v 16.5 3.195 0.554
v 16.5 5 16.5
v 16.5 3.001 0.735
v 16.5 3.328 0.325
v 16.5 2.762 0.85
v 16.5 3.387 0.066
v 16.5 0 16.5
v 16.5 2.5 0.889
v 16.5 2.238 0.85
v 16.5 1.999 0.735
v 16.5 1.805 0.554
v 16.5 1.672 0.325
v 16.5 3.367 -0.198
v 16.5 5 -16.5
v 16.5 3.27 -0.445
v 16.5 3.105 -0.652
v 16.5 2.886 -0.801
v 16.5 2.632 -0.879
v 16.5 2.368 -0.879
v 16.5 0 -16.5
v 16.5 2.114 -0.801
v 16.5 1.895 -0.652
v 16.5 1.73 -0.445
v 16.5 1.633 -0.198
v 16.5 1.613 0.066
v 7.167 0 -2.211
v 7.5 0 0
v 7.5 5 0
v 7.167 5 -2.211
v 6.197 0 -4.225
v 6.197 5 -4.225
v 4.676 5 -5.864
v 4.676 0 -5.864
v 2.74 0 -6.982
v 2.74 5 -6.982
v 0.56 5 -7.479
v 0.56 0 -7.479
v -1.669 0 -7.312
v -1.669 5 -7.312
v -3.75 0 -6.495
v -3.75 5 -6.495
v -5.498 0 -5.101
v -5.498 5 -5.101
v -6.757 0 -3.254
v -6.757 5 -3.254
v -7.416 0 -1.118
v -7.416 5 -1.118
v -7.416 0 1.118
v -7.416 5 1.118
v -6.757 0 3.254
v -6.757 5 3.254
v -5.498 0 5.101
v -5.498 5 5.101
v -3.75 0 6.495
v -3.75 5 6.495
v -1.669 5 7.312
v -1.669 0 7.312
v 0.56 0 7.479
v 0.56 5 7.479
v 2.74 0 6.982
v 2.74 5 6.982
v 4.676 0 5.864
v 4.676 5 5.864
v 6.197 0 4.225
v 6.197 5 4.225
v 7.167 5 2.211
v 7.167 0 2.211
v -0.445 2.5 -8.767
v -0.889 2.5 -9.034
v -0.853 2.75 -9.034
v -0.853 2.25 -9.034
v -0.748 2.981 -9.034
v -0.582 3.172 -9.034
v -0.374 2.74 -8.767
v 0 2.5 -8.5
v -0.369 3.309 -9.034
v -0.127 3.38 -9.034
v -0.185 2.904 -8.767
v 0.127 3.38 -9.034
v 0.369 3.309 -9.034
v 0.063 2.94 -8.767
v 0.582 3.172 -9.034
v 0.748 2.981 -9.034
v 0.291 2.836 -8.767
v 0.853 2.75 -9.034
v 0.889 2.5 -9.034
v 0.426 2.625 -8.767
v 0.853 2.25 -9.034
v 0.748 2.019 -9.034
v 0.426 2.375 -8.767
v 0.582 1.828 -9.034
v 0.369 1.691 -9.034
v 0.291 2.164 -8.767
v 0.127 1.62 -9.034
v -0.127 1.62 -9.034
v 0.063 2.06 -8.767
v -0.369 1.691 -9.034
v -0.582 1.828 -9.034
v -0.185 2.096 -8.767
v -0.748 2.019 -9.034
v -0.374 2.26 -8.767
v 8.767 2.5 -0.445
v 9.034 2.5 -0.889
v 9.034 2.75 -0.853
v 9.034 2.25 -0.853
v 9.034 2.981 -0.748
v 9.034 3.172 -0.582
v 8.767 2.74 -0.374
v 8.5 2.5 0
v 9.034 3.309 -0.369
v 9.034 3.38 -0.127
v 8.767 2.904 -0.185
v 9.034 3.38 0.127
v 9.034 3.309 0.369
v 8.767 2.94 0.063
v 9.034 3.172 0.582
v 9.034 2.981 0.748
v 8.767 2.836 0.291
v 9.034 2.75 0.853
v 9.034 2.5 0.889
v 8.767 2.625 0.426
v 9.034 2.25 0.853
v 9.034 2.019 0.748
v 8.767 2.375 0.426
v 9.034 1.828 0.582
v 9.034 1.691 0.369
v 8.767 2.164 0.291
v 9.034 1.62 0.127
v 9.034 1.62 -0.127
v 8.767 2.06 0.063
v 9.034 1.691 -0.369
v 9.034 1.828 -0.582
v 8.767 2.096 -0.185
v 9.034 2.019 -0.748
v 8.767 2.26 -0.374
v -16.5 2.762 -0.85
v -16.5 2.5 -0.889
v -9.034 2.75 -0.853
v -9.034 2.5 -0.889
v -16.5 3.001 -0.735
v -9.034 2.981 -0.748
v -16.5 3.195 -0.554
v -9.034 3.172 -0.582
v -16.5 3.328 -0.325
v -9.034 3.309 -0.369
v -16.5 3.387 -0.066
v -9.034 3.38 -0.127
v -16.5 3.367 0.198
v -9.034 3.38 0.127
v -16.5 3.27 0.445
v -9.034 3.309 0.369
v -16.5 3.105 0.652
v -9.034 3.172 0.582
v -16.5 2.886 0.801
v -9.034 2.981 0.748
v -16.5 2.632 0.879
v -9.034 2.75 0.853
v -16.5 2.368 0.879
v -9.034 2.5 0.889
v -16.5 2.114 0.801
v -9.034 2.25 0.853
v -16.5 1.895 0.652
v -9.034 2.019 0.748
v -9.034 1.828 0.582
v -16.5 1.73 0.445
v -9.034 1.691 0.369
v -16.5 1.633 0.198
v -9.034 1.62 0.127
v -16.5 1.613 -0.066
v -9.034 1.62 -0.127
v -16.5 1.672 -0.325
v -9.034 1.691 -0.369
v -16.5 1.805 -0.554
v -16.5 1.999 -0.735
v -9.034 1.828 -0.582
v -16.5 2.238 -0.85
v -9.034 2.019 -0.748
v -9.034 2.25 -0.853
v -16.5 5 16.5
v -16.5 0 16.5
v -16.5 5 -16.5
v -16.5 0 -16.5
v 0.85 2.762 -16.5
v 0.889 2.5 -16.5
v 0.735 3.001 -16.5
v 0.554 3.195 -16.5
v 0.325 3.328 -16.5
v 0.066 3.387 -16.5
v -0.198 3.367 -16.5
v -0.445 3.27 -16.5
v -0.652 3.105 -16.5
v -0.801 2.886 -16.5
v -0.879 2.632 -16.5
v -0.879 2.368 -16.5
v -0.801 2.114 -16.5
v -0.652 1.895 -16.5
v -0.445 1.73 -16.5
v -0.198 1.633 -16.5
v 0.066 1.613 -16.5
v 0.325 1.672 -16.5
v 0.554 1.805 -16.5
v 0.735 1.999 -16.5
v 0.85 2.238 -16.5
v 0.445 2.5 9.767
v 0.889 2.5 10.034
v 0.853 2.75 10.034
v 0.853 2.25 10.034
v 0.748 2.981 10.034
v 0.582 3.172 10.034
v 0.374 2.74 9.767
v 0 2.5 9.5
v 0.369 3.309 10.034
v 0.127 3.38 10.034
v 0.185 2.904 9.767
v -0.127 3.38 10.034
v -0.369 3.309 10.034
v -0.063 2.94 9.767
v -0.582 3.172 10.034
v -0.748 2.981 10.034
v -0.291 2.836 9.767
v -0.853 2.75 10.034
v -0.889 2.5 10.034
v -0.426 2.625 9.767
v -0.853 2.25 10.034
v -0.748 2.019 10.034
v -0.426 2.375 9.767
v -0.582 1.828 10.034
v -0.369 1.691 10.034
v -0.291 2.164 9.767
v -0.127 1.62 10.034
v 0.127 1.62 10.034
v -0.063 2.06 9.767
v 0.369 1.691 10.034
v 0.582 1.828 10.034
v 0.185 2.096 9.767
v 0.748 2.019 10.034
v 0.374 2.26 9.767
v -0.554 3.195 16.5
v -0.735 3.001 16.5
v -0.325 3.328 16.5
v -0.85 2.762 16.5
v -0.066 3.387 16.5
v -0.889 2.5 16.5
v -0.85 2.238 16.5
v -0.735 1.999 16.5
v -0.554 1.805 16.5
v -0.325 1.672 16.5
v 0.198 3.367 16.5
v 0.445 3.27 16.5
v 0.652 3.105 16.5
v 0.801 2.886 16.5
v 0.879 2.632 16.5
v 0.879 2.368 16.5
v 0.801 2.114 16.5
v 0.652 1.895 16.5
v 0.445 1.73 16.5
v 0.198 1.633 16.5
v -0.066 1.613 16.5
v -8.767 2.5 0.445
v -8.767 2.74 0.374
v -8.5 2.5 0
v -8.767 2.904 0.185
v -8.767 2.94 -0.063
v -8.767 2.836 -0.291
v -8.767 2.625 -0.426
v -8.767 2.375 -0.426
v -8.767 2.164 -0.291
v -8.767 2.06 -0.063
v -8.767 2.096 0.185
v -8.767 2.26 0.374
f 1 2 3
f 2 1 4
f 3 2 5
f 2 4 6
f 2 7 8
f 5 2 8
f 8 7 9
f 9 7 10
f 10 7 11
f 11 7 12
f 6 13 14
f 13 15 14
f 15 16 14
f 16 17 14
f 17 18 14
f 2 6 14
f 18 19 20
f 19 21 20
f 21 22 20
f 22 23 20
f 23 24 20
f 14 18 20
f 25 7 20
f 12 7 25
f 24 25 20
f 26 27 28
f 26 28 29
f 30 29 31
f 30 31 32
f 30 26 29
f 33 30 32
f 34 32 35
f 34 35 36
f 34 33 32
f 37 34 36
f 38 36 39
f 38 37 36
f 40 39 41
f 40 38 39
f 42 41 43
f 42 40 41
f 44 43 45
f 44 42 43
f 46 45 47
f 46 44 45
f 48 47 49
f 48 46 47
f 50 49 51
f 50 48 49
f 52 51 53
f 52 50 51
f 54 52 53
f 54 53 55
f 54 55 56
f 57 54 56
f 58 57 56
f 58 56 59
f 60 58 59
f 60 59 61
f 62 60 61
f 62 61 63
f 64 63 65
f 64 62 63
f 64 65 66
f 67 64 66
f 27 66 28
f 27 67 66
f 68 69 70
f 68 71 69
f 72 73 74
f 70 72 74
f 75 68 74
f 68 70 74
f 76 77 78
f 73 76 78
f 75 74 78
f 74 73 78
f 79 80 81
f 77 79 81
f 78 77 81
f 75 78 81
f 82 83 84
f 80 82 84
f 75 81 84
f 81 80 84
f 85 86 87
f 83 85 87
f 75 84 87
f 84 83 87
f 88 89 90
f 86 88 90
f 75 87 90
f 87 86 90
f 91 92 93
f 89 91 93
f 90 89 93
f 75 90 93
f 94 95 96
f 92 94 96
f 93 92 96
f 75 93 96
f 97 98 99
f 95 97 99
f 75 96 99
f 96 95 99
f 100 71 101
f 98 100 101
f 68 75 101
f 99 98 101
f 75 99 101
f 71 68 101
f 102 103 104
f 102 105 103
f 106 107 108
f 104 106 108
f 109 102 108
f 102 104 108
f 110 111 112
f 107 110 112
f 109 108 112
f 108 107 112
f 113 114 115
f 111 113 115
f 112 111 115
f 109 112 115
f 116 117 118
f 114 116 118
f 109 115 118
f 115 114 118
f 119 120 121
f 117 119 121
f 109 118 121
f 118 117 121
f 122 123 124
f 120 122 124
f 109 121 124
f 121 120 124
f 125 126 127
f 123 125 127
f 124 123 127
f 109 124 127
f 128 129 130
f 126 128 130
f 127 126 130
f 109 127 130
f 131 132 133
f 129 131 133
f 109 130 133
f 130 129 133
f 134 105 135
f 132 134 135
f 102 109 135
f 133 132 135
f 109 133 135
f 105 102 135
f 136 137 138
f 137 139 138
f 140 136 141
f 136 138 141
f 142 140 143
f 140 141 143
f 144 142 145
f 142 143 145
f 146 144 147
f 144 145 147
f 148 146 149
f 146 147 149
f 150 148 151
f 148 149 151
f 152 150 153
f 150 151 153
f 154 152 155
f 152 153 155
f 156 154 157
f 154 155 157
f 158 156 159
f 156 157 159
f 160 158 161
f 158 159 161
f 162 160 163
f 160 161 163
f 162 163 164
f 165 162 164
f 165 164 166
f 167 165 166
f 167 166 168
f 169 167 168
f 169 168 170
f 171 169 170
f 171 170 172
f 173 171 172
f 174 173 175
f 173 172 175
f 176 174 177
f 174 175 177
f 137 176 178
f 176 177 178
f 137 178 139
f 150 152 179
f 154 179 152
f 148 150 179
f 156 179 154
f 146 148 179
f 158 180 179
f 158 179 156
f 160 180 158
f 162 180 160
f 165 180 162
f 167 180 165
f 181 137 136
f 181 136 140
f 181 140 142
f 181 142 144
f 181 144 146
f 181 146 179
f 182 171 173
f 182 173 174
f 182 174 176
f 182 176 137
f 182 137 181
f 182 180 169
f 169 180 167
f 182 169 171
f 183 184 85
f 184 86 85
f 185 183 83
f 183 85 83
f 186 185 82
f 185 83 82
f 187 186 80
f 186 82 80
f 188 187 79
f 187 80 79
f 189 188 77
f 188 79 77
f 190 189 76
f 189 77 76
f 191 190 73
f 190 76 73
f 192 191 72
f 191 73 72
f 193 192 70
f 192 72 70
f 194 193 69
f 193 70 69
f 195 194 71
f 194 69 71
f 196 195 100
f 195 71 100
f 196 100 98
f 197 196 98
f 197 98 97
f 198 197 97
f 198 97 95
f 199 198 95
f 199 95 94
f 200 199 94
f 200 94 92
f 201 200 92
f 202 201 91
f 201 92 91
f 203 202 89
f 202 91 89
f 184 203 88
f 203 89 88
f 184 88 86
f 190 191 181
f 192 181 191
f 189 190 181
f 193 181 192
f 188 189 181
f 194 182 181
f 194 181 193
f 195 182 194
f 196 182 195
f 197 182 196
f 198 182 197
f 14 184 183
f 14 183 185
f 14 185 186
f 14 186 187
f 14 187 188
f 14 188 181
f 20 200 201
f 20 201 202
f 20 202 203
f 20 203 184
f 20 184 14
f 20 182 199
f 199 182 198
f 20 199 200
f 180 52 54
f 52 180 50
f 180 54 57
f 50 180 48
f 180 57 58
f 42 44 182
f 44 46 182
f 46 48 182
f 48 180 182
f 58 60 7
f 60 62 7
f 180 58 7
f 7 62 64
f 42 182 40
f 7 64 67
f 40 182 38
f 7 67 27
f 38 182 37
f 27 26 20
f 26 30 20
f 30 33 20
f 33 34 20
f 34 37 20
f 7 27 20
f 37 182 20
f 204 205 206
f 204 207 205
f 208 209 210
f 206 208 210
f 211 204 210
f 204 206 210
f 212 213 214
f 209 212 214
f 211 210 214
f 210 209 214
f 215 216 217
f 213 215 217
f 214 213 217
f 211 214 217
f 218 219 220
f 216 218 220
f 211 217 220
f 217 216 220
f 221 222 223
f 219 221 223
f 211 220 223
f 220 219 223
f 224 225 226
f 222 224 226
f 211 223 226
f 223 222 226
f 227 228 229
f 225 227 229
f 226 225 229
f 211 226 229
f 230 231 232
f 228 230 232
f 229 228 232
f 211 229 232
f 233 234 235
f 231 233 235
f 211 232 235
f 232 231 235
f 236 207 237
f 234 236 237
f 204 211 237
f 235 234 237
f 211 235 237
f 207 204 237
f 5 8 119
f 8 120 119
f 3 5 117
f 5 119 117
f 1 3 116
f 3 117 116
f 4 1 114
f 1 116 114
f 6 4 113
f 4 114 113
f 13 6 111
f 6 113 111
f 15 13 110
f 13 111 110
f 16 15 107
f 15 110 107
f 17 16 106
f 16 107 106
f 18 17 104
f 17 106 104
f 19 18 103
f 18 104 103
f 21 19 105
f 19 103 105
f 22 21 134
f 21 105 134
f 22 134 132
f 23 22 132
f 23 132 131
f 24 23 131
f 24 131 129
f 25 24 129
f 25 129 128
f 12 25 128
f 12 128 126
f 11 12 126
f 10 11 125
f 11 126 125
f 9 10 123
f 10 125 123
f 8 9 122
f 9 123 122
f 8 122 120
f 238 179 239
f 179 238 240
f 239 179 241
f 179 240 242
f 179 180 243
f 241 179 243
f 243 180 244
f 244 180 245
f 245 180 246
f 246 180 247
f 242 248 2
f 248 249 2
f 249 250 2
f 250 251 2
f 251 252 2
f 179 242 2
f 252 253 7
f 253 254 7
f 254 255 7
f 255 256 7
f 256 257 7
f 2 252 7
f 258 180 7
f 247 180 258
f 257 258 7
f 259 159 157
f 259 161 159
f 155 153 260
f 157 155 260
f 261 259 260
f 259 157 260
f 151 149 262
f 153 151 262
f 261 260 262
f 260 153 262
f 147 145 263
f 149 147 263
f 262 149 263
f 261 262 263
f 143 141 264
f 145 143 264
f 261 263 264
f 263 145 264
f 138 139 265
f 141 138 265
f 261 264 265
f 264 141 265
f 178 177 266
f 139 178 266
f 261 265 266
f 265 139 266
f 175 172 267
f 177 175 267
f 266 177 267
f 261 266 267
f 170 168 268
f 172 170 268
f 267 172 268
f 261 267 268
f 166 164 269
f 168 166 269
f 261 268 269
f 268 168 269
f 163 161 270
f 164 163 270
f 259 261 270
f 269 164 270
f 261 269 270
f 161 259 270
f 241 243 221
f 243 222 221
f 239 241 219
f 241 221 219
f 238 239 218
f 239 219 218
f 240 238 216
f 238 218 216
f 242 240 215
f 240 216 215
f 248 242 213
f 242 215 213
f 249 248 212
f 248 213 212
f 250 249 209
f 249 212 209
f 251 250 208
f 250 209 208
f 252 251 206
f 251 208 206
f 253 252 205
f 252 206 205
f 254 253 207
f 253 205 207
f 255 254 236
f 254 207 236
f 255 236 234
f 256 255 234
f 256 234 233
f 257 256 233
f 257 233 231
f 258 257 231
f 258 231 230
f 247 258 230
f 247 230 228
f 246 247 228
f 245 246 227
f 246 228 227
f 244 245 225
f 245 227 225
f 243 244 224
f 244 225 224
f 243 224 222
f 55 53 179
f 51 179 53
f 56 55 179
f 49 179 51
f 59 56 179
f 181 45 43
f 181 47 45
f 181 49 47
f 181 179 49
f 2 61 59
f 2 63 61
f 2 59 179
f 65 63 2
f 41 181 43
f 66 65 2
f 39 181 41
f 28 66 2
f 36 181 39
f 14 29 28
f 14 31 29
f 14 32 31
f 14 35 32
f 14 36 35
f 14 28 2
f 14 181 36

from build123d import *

# Parameters (mm, degrees)
SKETCH1_W                 = 33
SKETCH1_H                 = 33
SKETCH1_R                 = 7.5
BOSS_EXTRUDE1_DEPTH       = 5
F_2_56_TAPPED_HOLE4_D     = 1.778
F_2_56_TAPPED_HOLE4_DEPTH = 6.46583491
F_2_56_TAPPED_HOLE4_TIP   = 0.53416509
F_2_56_TAPPED_HOLE5_D     = 1.778
F_2_56_TAPPED_HOLE5_DEPTH = 7.46583491
F_2_56_TAPPED_HOLE5_TIP   = 0.53416509
F_2_56_TAPPED_HOLE6_D     = 1.778
F_2_56_TAPPED_HOLE6_DEPTH = 7.46583491
F_2_56_TAPPED_HOLE6_TIP   = 0.53416509
F_2_56_TAPPED_HOLE7_D     = 1.778
F_2_56_TAPPED_HOLE7_DEPTH = 7.46583491
F_2_56_TAPPED_HOLE7_TIP   = 0.53416509


with BuildPart() as part:
    # Sketch1 → Boss-Extrude1 (new body)
    with BuildSketch(Plane(origin=(0, 0, 0), x_dir=(1, 0, 0), z_dir=(0, 1, 0))):
        Rectangle(SKETCH1_W, SKETCH1_H)
        Circle(SKETCH1_R, mode=Mode.SUBTRACT)
    extrude(amount=BOSS_EXTRUDE1_DEPTH)

    # #2-56 Tapped Hole4
    with Locations(Plane.XY.offset(16.5)):
        with Locations((0, 2.5)):
            Hole(F_2_56_TAPPED_HOLE4_D / 2, depth=F_2_56_TAPPED_HOLE4_DEPTH)
            with Locations((0, 0, -(F_2_56_TAPPED_HOLE4_DEPTH + F_2_56_TAPPED_HOLE4_TIP / 2))):  # 118° drill point
                Cone(0, F_2_56_TAPPED_HOLE4_D / 2, F_2_56_TAPPED_HOLE4_TIP, mode=Mode.SUBTRACT)

    # #2-56 Tapped Hole5
    with Locations(Plane(origin=(0, 0, -16.5), x_dir=(-1, 0, 0), z_dir=(0, 0, -1))):
        with Locations((0, 2.5)):
            Hole(F_2_56_TAPPED_HOLE5_D / 2, depth=F_2_56_TAPPED_HOLE5_DEPTH)
            with Locations((0, 0, -(F_2_56_TAPPED_HOLE5_DEPTH + F_2_56_TAPPED_HOLE5_TIP / 2))):  # 118° drill point
                Cone(0, F_2_56_TAPPED_HOLE5_D / 2, F_2_56_TAPPED_HOLE5_TIP, mode=Mode.SUBTRACT)

    # #2-56 Tapped Hole6
    with Locations(Plane(origin=(16.5, 0, 0), x_dir=(0, 0, -1), z_dir=(1, 0, 0))):
        with Locations((0, 2.5)):
            Hole(F_2_56_TAPPED_HOLE6_D / 2, depth=F_2_56_TAPPED_HOLE6_DEPTH)
            with Locations((0, 0, -(F_2_56_TAPPED_HOLE6_DEPTH + F_2_56_TAPPED_HOLE6_TIP / 2))):  # 118° drill point
                Cone(0, F_2_56_TAPPED_HOLE6_D / 2, F_2_56_TAPPED_HOLE6_TIP, mode=Mode.SUBTRACT)

    # #2-56 Tapped Hole7
    with Locations(Plane.ZY.offset(16.5)):
        with Locations((0, 2.5)):
            Hole(F_2_56_TAPPED_HOLE7_D / 2, depth=F_2_56_TAPPED_HOLE7_DEPTH)
            with Locations((0, 0, -(F_2_56_TAPPED_HOLE7_DEPTH + F_2_56_TAPPED_HOLE7_TIP / 2))):  # 118° drill point
                Cone(0, F_2_56_TAPPED_HOLE7_D / 2, F_2_56_TAPPED_HOLE7_TIP, mode=Mode.SUBTRACT)


solid = part.part
